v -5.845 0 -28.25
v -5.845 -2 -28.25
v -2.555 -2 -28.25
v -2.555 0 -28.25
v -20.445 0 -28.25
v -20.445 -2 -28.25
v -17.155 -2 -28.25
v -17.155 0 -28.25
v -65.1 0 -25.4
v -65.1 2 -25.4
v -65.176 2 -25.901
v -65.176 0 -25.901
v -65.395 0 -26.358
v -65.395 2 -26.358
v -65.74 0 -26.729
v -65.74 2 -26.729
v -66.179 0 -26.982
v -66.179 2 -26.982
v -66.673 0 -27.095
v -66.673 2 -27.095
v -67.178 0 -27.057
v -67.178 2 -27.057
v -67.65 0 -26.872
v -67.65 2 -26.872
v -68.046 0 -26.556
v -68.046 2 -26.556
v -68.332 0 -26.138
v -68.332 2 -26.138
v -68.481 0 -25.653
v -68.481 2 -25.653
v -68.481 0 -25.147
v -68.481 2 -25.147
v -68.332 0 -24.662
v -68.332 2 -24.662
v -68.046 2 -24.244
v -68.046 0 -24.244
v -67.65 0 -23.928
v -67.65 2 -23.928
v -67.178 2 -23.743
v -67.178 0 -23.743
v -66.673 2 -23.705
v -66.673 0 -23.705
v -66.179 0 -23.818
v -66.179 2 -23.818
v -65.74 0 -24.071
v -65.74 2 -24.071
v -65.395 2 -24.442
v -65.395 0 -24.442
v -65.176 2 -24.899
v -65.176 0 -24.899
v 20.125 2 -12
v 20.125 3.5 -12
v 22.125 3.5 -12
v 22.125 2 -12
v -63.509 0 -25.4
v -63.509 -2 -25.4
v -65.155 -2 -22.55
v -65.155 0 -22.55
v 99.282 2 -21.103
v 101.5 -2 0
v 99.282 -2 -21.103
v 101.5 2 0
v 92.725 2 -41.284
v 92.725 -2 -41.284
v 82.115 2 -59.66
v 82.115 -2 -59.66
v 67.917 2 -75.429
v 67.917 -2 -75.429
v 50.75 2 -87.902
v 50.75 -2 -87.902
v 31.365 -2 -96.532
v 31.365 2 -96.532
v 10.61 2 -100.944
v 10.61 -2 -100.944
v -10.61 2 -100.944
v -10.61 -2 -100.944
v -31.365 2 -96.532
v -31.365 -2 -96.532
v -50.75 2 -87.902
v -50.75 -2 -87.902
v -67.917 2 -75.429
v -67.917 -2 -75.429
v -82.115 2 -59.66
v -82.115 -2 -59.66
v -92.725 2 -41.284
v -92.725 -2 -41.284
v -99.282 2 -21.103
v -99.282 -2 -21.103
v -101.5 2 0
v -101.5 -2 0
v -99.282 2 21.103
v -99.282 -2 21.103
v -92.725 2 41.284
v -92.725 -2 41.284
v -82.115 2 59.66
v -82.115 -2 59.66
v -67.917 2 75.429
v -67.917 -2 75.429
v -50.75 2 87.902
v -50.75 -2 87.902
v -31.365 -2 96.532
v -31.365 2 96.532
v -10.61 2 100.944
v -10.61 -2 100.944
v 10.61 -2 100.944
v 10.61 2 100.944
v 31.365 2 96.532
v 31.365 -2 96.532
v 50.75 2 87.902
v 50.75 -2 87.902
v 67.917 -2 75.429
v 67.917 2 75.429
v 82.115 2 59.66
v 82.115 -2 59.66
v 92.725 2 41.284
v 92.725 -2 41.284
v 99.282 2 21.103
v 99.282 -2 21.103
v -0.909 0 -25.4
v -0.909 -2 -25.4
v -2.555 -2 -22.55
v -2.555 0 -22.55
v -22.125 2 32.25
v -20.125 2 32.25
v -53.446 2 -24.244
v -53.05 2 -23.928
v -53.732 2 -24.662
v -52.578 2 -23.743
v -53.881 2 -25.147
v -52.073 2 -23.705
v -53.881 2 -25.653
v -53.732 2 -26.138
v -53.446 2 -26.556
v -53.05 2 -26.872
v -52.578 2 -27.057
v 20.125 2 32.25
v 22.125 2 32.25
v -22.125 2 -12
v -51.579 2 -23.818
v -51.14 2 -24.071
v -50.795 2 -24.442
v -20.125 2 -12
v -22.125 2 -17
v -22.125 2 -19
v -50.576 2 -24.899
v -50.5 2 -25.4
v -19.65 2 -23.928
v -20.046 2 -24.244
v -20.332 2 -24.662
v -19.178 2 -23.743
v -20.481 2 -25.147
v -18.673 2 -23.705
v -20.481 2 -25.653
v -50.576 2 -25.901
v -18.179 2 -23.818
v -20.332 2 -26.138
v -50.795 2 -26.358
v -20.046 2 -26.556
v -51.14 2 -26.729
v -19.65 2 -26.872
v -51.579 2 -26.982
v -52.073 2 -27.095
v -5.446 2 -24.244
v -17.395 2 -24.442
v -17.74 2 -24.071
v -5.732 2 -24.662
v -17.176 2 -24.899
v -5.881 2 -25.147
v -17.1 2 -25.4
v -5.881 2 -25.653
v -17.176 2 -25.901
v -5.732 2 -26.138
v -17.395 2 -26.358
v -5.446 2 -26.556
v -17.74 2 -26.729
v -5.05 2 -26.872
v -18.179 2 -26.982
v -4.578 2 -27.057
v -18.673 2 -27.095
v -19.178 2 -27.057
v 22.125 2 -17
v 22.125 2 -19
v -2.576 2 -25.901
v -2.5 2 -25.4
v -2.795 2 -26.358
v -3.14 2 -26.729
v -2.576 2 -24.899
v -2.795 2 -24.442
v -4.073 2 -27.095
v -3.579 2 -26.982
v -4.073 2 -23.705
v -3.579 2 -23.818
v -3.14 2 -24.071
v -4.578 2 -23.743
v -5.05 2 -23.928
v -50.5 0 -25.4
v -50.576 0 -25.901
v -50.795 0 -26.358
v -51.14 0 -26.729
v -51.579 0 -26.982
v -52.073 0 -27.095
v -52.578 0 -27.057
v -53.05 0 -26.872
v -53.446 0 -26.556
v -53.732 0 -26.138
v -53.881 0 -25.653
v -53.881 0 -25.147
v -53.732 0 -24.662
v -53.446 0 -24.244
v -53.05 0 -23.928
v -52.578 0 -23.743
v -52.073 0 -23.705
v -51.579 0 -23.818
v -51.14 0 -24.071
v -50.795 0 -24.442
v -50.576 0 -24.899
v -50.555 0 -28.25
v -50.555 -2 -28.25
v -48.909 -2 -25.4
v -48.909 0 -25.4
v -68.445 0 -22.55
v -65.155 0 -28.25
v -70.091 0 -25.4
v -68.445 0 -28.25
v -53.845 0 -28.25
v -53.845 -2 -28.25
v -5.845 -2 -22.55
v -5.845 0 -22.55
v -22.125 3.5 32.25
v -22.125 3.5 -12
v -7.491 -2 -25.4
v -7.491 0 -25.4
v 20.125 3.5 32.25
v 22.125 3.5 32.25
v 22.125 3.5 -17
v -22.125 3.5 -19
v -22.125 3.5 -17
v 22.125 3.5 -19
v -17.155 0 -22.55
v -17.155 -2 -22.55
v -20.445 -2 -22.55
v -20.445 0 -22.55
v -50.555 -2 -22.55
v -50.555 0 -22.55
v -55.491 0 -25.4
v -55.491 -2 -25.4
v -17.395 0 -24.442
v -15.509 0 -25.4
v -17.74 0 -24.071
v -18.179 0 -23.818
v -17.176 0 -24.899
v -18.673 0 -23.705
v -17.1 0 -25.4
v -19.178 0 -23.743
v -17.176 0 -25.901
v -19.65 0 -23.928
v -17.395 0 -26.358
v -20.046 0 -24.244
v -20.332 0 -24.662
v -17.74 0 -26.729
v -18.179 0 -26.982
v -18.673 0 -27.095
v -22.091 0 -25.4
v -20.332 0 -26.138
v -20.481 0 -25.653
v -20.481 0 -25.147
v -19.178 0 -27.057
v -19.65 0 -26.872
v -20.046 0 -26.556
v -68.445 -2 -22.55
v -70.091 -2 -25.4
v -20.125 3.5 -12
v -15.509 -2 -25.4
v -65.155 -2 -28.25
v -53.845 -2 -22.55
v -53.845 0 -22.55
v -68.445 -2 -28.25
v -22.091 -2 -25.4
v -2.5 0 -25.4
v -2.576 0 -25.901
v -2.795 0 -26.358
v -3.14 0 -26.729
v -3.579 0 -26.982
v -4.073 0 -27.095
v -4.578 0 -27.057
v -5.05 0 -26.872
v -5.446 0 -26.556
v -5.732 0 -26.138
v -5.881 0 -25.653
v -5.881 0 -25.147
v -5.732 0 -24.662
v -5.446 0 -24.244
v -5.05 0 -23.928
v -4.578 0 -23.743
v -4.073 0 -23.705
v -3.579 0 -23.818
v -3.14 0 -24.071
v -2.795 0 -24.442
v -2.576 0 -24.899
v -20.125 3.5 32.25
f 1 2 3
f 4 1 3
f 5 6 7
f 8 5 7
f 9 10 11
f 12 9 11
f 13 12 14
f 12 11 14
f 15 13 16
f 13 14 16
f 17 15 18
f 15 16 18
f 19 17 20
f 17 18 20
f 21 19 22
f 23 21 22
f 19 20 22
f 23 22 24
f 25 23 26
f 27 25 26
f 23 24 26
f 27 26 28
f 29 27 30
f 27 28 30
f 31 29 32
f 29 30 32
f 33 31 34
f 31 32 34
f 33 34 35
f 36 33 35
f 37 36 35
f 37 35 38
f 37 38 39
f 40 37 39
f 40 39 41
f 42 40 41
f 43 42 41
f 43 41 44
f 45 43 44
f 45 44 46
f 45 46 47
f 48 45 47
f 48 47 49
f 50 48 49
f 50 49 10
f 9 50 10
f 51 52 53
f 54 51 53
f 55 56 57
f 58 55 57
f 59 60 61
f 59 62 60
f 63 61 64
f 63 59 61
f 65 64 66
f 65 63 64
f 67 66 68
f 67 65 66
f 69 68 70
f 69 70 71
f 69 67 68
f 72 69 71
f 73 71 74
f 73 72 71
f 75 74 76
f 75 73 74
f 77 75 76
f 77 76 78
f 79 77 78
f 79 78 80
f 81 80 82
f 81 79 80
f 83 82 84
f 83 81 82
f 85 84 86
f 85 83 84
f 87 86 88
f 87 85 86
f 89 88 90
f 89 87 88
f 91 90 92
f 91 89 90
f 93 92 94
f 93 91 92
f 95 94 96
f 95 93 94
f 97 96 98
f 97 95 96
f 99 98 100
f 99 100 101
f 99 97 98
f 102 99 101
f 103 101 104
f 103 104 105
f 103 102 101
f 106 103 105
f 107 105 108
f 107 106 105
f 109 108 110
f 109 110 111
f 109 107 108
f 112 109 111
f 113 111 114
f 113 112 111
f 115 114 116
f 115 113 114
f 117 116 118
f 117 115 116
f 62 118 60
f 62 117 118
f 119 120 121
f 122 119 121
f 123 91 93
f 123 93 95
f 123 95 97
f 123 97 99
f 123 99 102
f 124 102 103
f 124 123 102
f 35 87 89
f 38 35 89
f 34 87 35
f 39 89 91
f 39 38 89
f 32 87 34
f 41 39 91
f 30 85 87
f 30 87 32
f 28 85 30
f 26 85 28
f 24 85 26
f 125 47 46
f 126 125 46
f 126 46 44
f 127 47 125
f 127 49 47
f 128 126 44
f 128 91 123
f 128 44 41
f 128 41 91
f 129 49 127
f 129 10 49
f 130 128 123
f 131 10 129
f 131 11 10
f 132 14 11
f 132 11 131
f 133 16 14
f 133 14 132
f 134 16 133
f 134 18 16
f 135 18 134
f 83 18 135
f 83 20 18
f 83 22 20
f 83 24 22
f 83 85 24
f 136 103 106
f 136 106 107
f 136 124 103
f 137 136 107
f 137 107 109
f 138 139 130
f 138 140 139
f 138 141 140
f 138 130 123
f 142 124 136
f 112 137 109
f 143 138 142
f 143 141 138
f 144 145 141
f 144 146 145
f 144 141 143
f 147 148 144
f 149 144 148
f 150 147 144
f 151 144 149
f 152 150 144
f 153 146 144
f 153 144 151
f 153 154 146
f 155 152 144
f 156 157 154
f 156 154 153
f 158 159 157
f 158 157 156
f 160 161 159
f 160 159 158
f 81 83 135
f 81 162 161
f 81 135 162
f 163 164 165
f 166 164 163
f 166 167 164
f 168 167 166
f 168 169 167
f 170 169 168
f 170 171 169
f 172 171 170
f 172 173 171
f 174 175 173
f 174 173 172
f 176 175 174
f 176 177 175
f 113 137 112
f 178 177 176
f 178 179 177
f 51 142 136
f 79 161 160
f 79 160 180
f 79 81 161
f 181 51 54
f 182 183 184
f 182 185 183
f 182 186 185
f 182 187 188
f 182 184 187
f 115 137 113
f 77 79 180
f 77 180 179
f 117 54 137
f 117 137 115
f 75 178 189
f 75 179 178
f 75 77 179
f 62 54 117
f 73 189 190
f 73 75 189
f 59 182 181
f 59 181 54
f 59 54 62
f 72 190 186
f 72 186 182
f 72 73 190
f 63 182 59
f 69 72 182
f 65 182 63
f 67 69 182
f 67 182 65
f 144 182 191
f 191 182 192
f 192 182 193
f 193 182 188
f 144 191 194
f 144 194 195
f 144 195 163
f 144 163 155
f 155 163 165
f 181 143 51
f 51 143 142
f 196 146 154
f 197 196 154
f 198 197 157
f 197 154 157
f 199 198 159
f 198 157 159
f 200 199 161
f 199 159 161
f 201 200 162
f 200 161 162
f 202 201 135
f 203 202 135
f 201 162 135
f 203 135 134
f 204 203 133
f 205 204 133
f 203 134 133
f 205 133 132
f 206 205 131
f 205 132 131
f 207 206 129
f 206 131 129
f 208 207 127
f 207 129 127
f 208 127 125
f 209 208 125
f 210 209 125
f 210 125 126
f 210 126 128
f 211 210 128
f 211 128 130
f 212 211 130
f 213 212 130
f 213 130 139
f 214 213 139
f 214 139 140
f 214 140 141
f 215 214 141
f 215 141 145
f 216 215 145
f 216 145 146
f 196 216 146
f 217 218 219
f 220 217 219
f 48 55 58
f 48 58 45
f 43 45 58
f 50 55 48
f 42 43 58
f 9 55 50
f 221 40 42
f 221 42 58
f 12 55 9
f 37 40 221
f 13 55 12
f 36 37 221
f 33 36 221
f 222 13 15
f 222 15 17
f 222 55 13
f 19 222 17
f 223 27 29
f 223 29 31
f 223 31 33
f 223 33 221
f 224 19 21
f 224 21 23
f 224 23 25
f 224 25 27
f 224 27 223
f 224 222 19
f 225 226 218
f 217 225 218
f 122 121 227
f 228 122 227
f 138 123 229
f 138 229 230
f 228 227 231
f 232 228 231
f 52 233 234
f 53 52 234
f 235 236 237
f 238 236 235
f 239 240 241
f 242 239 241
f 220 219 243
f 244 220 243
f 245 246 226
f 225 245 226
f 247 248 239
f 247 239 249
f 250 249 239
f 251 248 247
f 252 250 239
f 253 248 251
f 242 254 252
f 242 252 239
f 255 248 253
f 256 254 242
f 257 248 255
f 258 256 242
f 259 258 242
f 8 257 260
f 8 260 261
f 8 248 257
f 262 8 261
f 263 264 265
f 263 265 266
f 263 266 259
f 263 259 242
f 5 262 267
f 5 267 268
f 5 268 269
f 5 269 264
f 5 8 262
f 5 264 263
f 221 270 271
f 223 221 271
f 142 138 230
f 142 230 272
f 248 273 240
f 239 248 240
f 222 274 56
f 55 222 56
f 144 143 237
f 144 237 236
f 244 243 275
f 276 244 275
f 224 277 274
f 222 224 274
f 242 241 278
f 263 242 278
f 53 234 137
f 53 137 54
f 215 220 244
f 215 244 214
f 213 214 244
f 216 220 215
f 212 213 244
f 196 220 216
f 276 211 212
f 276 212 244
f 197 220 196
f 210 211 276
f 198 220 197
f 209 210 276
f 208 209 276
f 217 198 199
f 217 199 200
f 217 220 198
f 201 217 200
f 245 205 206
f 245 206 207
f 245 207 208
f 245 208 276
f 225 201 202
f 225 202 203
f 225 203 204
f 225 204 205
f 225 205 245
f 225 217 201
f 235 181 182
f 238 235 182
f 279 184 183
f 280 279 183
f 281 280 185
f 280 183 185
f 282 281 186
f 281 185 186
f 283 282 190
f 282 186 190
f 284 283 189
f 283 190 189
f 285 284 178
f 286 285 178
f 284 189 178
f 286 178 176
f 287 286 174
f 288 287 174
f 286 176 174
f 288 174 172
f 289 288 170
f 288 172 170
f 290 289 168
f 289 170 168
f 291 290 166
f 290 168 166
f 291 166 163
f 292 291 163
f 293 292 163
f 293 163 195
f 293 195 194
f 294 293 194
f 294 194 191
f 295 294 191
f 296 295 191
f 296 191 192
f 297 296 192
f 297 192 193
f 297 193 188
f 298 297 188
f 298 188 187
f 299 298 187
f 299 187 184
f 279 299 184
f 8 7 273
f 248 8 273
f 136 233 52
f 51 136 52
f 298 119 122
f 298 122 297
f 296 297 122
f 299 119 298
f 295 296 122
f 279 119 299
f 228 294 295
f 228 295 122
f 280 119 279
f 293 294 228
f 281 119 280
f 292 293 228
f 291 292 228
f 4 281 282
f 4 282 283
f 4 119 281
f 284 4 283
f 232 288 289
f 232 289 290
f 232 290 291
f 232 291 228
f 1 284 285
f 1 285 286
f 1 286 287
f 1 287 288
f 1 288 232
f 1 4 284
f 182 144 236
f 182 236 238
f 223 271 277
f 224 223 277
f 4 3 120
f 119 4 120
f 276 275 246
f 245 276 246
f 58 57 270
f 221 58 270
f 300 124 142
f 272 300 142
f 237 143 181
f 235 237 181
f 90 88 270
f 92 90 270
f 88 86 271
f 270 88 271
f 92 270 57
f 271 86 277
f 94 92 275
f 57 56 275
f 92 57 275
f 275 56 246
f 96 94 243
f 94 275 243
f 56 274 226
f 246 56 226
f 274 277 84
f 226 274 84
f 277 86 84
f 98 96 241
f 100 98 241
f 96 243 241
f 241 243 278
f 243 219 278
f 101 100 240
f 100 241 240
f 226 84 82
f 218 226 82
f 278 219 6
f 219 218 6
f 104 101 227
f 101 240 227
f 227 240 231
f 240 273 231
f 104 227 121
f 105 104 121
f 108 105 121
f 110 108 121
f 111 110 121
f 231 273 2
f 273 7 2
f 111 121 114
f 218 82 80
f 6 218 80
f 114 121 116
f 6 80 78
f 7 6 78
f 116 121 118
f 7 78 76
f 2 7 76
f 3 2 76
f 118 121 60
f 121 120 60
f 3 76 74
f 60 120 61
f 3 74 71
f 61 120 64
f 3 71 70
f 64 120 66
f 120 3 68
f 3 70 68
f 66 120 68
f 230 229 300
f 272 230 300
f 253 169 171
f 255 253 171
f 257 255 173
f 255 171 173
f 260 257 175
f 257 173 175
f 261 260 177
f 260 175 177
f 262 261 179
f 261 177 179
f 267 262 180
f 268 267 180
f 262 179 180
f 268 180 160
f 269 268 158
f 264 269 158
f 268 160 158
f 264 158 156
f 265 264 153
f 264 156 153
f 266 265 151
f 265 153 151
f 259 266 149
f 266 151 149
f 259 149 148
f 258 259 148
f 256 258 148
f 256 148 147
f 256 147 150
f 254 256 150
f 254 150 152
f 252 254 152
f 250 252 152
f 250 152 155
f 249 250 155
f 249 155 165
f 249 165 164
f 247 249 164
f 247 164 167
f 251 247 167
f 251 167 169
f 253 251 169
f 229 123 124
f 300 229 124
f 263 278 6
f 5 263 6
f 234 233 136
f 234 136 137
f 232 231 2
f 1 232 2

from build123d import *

# Parameters (mm, degrees)
SKETCH2_R           = 101.5
BOSS_EXTRUDE2_DEPTH = 2
SKETCH4_W           = 44.25
SKETCH4_H           = 2
SKETCH4_W_2         = 2
SKETCH4_H_2         = 44.25
BOSS_EXTRUDE3_DEPTH = 1.5
SKETCH5_R           = 1.7
CUT_EXTRUDE1_DEPTH  = 5
CUT_EXTRUDE2_DEPTH  = 2


with BuildPart() as part:
    # Sketch2 → Boss-Extrude2 (new body, symmetric)
    with BuildSketch(Plane(origin=(0, 0, 0), x_dir=(1, 0, 0), z_dir=(0, 1, 0))):
        Circle(SKETCH2_R)
    extrude(amount=BOSS_EXTRUDE2_DEPTH, both=True)

    # Sketch4 → Boss-Extrude3 (add, symmetric)
    with BuildSketch(Plane(origin=(0, 2, 0), x_dir=(1, 0, 0), z_dir=(0, 1, 0))):
        with Locations((0, 18)):
            Rectangle(SKETCH4_W, SKETCH4_H)
        with Locations((-21.125, -10.125)):
            Rectangle(SKETCH4_W_2, SKETCH4_H_2)
        with Locations((21.125, -10.125)):
            Rectangle(SKETCH4_W_2, SKETCH4_H_2)
    extrude(amount=BOSS_EXTRUDE3_DEPTH, both=True)

    # Sketch5 → Cut-Extrude1 (cut, through all)
    with BuildSketch(Plane(origin=(0, 2, 0), x_dir=(1, 0, 0), z_dir=(0, 1, 0))):
        with Locations((-66.8, 25.4)):
            Circle(SKETCH5_R)
        with Locations((-52.2, 25.4)):
            Circle(SKETCH5_R)
        with Locations((-18.8, 25.4)):
            Circle(SKETCH5_R)
        with Locations((-4.2, 25.4)):
            Circle(SKETCH5_R)
    extrude(amount=-CUT_EXTRUDE1_DEPTH, mode=Mode.SUBTRACT)

    # Sketch6 → Cut-Extrude2 (cut)
    with BuildSketch(Plane(origin=(0, -2, 0), x_dir=(-1, 0, 0), z_dir=(0, -1, 0))):
        Polygon((7.490896534, 25.4), (5.845448267, 28.25), (2.554551733, 28.25), (0.909103466, 25.4), (2.554551733, 22.55), (5.845448267, 22.55), align=None)
        Polygon((22.090896534, 25.4), (20.445448267, 28.25), (17.154551733, 28.25), (15.509103466, 25.4), (17.154551733, 22.55), (20.445448267, 22.55), align=None)
        Polygon((55.490896534, 25.4), (53.845448267, 28.25), (50.554551733, 28.25), (48.909103466, 25.4), (50.554551733, 22.55), (53.845448267, 22.55), align=None)
        Polygon((70.090896534, 25.4), (68.445448267, 28.25), (65.154551733, 28.25), (63.509103466, 25.4), (65.154551733, 22.55), (68.445448267, 22.55), align=None)
    extrude(amount=-CUT_EXTRUDE2_DEPTH, mode=Mode.SUBTRACT)


solid = part.part
